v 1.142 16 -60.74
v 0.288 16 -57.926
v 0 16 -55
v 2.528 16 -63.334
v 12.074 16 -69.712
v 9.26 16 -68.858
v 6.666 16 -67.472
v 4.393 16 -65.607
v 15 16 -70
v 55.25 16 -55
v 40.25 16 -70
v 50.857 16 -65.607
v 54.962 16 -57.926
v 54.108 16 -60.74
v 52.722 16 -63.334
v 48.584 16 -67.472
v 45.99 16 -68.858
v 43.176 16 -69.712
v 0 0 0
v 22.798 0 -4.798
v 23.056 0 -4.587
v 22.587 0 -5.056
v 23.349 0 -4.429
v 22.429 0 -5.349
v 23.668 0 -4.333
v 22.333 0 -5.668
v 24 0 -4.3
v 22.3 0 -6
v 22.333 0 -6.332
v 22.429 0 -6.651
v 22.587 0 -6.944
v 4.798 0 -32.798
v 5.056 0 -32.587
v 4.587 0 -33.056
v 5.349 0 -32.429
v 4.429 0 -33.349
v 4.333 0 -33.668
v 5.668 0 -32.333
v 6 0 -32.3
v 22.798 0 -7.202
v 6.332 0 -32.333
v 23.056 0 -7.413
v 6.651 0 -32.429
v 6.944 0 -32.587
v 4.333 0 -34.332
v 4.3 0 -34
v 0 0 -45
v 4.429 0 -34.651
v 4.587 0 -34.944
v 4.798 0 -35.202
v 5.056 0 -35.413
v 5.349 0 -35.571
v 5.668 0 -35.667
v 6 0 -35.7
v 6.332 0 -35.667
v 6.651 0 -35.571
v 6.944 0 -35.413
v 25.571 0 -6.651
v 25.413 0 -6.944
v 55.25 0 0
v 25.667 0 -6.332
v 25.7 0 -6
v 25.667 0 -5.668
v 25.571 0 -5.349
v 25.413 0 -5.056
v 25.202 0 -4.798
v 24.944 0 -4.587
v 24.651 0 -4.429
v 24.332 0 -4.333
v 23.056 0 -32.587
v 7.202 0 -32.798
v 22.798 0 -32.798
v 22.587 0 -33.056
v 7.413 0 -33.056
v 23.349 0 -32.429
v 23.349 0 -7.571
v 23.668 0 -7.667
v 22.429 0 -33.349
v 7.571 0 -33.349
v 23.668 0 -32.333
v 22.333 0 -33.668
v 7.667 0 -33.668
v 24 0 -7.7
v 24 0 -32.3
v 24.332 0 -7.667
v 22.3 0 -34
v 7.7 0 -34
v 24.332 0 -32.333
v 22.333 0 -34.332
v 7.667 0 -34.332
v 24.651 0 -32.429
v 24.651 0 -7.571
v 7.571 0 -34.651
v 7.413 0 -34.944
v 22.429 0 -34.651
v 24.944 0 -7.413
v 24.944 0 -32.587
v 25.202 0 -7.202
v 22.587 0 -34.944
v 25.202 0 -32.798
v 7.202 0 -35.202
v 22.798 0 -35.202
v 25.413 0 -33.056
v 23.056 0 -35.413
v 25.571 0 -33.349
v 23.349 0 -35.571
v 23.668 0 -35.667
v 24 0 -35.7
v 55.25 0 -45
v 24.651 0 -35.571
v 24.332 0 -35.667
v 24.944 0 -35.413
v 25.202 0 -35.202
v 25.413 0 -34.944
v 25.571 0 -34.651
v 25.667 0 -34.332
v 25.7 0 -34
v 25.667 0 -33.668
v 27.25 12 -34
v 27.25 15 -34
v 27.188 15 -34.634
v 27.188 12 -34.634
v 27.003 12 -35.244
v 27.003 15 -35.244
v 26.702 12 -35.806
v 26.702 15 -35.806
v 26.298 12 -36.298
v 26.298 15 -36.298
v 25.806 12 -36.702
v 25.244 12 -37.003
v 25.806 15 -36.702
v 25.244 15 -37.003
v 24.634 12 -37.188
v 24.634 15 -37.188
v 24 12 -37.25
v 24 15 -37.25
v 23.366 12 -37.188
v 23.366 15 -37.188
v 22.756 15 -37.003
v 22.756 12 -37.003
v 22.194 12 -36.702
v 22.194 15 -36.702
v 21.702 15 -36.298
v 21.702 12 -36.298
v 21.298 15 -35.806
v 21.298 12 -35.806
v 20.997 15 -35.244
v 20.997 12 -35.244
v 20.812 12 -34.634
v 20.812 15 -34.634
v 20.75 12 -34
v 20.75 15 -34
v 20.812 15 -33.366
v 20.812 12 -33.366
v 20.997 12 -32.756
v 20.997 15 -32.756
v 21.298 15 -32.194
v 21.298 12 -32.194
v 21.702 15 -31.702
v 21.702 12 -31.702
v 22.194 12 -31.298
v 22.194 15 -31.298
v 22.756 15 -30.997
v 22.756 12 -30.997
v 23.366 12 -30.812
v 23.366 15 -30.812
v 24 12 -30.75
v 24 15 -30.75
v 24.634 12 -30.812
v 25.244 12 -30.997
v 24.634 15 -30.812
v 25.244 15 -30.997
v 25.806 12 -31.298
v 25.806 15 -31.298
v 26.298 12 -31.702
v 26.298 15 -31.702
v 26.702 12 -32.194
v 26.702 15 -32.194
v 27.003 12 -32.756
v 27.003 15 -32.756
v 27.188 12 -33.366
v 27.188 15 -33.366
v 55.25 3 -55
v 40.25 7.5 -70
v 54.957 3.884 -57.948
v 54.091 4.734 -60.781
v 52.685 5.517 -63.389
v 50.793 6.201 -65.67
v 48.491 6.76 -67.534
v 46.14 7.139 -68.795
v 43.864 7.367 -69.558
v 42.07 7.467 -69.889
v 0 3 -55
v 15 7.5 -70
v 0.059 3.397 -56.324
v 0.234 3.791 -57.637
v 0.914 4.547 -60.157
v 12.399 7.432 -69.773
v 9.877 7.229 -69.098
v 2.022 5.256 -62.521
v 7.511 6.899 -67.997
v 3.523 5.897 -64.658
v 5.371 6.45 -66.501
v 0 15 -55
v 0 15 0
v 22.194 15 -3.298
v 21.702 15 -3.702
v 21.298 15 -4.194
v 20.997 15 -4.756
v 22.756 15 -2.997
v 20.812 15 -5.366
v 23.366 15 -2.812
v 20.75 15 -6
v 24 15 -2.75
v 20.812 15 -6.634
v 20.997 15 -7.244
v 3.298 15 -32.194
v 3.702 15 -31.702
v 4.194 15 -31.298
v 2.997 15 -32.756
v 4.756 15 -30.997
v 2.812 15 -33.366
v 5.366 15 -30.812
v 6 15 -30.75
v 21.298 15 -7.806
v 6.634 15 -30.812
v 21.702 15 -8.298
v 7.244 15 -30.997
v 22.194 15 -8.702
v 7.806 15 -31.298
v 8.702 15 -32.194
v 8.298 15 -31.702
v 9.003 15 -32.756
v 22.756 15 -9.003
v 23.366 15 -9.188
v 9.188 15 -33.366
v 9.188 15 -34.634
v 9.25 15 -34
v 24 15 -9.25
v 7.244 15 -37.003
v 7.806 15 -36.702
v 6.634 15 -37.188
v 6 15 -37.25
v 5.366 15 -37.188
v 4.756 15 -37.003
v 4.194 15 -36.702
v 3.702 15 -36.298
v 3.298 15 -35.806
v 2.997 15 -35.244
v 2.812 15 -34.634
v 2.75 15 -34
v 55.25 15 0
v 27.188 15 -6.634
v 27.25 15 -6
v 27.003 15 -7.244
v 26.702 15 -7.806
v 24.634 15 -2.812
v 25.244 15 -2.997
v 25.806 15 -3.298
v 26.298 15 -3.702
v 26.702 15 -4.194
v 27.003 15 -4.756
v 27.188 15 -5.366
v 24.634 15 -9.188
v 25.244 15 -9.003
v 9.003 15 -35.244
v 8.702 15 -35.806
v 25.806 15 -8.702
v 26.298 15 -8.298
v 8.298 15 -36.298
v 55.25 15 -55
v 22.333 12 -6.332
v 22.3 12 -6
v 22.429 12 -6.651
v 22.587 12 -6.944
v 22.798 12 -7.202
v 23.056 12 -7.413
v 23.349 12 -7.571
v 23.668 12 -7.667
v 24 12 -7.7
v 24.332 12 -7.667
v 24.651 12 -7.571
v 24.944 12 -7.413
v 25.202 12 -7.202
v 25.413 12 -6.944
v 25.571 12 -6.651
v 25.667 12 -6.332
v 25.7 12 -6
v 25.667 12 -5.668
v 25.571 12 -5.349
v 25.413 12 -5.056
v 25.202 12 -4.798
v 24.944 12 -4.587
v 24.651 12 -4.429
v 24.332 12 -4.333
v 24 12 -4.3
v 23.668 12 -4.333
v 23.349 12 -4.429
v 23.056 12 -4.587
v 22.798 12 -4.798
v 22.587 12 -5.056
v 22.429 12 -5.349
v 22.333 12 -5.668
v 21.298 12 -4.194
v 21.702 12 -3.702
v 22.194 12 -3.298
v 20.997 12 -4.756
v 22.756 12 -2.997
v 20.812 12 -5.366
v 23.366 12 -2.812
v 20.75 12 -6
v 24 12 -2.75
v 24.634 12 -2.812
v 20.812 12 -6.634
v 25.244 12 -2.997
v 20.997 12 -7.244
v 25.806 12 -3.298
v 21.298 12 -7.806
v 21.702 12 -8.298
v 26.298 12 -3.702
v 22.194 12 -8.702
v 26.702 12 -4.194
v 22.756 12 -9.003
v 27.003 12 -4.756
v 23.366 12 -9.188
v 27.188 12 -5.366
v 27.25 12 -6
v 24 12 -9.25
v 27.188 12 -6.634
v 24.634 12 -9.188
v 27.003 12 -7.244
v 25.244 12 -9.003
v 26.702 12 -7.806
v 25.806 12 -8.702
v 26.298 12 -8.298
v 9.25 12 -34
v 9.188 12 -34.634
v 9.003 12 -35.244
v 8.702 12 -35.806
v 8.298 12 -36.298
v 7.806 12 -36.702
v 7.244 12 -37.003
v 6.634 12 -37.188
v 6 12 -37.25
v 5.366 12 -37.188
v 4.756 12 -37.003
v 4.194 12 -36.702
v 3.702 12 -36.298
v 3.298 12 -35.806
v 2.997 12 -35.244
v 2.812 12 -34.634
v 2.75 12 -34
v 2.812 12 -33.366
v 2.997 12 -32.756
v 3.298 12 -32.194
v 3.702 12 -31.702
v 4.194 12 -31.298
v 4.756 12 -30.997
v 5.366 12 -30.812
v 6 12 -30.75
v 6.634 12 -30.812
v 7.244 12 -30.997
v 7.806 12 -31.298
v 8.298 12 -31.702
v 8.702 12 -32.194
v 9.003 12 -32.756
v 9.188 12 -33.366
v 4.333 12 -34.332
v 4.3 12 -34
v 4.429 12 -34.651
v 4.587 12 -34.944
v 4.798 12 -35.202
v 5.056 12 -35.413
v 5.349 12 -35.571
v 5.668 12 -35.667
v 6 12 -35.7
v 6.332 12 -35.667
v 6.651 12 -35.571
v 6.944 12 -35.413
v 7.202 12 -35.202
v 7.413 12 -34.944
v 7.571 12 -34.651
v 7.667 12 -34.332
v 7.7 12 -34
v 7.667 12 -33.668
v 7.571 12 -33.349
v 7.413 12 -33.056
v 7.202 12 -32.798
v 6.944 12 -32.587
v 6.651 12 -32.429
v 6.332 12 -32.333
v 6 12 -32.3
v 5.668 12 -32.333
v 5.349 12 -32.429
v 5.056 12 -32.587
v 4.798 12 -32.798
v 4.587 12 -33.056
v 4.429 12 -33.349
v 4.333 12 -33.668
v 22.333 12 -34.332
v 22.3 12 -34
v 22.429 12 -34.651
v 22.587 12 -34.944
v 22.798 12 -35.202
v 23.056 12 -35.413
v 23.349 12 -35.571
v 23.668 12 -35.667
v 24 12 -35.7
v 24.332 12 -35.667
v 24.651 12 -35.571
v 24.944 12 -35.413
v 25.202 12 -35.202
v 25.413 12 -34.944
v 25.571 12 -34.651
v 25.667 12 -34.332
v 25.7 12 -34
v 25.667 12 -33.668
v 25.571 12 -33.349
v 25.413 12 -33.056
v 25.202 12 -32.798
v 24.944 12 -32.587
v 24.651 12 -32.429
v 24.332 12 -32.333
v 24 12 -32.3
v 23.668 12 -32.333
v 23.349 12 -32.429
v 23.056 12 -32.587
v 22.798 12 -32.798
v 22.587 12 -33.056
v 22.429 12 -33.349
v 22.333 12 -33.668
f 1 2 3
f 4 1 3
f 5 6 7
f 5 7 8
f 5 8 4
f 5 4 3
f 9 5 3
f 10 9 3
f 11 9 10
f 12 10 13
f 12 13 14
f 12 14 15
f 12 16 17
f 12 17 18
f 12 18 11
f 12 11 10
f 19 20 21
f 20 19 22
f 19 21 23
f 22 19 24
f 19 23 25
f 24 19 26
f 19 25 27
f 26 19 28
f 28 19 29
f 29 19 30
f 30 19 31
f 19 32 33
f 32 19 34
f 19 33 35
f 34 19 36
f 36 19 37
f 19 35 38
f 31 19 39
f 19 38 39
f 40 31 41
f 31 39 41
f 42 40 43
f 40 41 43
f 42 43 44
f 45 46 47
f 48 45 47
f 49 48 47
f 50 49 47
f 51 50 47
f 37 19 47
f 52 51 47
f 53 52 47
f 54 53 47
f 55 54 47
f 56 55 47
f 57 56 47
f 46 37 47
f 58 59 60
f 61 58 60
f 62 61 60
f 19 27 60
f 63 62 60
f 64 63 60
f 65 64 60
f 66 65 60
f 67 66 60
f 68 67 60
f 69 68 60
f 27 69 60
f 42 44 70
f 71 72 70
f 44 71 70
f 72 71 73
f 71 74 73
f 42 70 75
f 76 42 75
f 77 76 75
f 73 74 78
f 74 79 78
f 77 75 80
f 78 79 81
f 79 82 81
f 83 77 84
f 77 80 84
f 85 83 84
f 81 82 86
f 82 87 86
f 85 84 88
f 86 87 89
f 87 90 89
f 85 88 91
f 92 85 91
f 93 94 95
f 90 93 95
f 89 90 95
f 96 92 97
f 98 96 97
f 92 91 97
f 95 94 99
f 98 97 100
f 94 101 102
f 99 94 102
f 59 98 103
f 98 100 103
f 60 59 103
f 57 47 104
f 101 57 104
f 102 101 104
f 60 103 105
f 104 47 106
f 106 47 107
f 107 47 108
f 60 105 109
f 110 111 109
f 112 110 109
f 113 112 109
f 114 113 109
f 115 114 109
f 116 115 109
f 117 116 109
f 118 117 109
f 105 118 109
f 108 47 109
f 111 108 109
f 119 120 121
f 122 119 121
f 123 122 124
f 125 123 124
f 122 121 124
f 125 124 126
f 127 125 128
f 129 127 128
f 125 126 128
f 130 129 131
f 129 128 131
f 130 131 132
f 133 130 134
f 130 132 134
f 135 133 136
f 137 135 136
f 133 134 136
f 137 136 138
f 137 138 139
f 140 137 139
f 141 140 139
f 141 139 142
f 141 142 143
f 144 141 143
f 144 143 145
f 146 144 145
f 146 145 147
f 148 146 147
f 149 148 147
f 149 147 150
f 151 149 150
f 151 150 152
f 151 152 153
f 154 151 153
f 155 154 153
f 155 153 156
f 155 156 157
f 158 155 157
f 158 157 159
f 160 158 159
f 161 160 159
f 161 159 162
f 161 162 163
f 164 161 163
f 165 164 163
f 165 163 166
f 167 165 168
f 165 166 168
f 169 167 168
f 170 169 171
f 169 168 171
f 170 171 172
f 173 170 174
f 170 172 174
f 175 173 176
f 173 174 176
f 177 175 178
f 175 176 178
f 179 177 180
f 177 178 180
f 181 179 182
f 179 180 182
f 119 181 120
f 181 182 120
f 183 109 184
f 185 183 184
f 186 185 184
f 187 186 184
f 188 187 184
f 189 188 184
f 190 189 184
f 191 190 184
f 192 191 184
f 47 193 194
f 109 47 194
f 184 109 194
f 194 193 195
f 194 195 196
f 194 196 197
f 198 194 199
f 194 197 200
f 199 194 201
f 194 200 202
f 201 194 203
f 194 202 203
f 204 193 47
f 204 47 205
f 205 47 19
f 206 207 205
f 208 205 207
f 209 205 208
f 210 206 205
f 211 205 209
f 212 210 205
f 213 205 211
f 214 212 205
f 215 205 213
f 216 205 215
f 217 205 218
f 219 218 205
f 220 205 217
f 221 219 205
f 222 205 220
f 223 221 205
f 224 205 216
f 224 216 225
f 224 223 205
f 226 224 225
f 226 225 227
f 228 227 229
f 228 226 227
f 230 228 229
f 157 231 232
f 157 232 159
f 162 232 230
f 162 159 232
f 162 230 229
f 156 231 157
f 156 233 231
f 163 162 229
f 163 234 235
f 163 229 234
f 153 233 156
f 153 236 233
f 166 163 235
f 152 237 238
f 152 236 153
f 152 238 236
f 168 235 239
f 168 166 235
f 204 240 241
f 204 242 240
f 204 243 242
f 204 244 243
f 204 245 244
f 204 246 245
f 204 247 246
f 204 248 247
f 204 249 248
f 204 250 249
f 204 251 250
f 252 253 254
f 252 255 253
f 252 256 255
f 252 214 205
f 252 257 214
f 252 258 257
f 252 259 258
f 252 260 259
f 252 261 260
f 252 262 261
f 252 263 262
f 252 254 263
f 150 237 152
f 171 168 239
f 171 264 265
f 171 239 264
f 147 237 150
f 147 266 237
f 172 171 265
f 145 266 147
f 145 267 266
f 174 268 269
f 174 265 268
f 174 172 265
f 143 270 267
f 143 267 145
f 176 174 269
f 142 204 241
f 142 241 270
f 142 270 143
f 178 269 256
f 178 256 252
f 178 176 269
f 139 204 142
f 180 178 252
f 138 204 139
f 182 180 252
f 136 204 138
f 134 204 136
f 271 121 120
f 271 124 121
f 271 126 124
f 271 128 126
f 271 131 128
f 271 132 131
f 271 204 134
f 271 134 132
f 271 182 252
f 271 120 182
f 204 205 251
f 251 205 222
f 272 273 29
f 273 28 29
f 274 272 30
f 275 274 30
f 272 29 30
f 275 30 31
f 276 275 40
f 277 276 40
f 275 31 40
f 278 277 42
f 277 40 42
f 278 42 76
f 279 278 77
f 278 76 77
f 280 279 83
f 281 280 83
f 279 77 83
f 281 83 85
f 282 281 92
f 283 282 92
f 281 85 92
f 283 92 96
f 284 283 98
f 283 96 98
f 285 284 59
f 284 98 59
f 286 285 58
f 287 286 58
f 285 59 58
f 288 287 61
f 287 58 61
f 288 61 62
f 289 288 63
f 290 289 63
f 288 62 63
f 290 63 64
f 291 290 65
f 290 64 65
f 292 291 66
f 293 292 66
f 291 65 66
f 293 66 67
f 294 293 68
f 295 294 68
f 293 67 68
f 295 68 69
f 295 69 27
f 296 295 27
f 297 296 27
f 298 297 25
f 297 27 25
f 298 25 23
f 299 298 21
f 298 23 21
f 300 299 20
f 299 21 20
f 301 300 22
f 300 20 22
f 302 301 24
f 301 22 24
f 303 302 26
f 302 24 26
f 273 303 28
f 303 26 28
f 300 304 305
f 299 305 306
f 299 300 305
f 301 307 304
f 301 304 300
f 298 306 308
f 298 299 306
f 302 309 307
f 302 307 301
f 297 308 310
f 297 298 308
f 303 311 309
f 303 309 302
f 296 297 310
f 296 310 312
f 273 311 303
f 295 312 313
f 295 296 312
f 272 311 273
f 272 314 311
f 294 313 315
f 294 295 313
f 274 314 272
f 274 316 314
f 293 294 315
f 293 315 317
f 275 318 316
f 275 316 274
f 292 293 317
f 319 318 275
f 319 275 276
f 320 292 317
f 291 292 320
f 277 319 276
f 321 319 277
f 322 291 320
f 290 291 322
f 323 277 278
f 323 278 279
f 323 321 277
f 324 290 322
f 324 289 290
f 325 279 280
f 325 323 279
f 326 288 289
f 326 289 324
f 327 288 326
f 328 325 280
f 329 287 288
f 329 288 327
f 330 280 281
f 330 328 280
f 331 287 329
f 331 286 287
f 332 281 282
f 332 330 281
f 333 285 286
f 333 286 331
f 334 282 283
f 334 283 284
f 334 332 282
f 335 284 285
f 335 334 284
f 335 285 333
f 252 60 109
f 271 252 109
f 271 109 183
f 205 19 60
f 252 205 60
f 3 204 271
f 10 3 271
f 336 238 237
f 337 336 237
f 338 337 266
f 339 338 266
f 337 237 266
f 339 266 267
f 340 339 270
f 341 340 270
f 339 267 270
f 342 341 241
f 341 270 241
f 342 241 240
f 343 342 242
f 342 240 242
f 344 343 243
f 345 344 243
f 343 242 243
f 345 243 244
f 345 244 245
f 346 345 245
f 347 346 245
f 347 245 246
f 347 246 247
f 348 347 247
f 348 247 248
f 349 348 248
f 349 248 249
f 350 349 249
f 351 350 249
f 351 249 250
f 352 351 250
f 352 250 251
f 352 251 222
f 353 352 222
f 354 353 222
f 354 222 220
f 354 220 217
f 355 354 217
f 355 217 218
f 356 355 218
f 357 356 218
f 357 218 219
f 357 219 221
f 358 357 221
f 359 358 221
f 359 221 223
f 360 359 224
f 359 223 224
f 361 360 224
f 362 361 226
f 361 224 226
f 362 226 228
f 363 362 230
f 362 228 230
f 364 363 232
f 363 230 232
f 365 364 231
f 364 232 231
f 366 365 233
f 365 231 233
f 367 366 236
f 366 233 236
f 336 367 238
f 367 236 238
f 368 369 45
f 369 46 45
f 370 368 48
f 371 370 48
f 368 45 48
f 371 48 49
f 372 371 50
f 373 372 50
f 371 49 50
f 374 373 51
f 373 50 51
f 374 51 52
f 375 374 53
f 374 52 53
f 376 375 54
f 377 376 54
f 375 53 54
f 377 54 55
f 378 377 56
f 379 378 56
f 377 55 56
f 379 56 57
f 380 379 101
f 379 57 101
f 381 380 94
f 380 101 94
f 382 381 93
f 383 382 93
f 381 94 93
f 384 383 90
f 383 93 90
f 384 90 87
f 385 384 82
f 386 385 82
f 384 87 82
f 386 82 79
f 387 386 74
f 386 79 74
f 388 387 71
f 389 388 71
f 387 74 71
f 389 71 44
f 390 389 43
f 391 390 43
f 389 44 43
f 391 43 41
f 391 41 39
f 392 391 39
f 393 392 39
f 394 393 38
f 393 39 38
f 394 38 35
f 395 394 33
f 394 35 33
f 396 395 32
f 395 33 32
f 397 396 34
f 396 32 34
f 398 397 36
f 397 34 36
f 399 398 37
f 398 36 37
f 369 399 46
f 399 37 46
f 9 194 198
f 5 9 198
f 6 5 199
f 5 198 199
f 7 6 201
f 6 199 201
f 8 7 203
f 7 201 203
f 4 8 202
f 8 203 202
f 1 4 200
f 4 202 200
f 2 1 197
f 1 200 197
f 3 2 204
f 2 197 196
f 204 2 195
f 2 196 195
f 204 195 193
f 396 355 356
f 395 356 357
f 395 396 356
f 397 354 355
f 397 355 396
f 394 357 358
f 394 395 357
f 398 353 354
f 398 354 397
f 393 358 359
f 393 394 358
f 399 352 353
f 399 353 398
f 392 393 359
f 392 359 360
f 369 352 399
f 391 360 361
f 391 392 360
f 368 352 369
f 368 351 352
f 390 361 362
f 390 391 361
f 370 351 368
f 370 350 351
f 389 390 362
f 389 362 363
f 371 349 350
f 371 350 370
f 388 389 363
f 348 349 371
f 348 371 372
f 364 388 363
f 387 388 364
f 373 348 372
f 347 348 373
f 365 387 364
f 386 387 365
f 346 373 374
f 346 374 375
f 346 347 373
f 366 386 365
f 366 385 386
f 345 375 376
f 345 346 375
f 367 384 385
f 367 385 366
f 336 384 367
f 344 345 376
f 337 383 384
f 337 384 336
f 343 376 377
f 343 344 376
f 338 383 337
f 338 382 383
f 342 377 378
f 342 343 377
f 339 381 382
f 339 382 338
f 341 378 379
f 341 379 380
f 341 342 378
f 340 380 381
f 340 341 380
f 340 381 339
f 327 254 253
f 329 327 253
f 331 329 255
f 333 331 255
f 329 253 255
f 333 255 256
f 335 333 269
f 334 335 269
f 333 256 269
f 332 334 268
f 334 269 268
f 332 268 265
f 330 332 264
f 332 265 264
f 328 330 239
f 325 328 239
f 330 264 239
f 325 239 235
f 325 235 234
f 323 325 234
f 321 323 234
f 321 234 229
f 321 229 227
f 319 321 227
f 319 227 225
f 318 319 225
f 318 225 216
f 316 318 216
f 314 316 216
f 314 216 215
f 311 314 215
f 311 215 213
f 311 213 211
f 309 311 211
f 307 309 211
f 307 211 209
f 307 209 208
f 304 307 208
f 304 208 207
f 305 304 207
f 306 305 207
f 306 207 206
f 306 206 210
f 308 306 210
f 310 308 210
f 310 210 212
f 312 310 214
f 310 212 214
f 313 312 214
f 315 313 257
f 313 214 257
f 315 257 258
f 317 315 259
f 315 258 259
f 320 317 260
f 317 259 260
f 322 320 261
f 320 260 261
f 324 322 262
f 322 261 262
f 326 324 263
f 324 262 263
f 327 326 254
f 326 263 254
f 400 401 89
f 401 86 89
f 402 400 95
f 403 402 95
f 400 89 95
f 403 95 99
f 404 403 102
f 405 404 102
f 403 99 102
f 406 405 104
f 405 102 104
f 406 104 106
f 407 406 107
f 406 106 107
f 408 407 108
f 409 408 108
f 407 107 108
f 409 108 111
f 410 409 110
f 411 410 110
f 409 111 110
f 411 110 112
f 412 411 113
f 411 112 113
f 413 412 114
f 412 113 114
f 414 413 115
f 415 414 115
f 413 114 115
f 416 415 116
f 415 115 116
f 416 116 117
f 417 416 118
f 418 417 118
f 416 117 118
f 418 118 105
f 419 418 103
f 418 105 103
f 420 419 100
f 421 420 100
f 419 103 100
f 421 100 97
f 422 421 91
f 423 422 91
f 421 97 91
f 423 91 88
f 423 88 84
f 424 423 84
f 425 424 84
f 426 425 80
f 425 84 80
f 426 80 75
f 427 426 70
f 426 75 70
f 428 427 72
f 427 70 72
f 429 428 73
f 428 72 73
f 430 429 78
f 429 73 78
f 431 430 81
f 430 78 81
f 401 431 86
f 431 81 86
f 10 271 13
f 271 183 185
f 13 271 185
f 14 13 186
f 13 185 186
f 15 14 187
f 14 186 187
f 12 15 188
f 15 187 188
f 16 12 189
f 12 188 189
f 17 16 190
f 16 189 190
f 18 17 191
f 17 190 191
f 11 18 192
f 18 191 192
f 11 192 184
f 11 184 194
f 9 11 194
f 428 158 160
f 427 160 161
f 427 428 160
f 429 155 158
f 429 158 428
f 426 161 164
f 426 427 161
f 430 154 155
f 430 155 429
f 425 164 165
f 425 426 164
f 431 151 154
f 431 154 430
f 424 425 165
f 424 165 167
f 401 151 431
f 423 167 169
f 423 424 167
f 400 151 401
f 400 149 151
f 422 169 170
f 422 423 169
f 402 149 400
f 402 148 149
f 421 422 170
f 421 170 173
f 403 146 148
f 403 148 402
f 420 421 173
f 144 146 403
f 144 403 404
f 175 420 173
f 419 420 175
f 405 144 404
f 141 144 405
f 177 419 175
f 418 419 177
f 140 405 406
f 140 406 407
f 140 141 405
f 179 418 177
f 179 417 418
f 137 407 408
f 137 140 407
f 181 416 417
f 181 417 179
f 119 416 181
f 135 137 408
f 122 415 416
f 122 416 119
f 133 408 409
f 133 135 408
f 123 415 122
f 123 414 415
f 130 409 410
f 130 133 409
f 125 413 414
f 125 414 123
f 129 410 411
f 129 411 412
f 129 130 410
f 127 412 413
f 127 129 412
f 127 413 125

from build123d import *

# Parameters (mm, degrees)
BOSS_EXTRUDE1_DEPTH            = 15
CBORE_FOR_M3_SHCS1_D           = 3.4
CBORE_FOR_M3_SHCS1_CBORE_D     = 6.5
CBORE_FOR_M3_SHCS1_CBORE_DEPTH = 3
CUT_EXTRUDE1_REACH             = 92.43
BOSS_EXTRUDE2_DEPTH            = 1


with BuildPart() as part:
    # Sketch1 → Boss-Extrude1 (new body)
    with BuildSketch(Plane(origin=(0, 0, 0), x_dir=(1, 0, 0), z_dir=(0, 1, 0))):
        with BuildLine():
            Line((0, 0), (55.25, 0))
            Line((55.25, 0), (55.25, 55))
            ThreePointArc((55.25, 55), (50.856601718, 65.606601718), (40.25, 70))
            Line((40.25, 70), (15, 70))
            ThreePointArc((15, 70), (4.393398282, 65.606601718), (0, 55))
            Line((0, 55), (0, 0))
        make_face()
    extrude(amount=BOSS_EXTRUDE1_DEPTH)

    # CBORE for M3 SHCS1 (through all)
    with Locations(Plane(origin=(0, 15, 0), x_dir=(1, 0, 0), z_dir=(0, 1, 0))):
        with Locations((6, 34), (24, 34), (24, 6)):
            CounterBoreHole(CBORE_FOR_M3_SHCS1_D / 2, CBORE_FOR_M3_SHCS1_CBORE_D / 2, CBORE_FOR_M3_SHCS1_CBORE_DEPTH)

    # Sketch4 → Cut-Extrude1 (cut, up to next)
    with BuildSketch(Plane.ZY, mode=Mode.PRIVATE) as cut_extrude1_sk1:
        Polygon((-70, 0), (-45, 0), (-70, 7.5), align=None)
    cut_extrude1_tool1 = extrude(cut_extrude1_sk1.sketch, amount=-CUT_EXTRUDE1_REACH, mode=Mode.PRIVATE) & part.part
    add(cut_extrude1_tool1.solids().sort_by_distance((0, 2.5, -61.666667))[0], mode=Mode.SUBTRACT)

    # Sketch5 → Boss-Extrude2 (add)
    with BuildSketch(Plane(origin=(0, 15, 0), x_dir=(1, 0, 0), z_dir=(0, 1, 0))):
        with BuildLine():
            ThreePointArc((15, 70), (4.393398282, 65.606601718), (0, 55))
            Line((0, 55), (55.25, 55))
            ThreePointArc((55.25, 55), (50.856601718, 65.606601718), (40.25, 70))
            Line((40.25, 70), (15, 70))
        make_face()
    extrude(amount=BOSS_EXTRUDE2_DEPTH)


solid = part.part
